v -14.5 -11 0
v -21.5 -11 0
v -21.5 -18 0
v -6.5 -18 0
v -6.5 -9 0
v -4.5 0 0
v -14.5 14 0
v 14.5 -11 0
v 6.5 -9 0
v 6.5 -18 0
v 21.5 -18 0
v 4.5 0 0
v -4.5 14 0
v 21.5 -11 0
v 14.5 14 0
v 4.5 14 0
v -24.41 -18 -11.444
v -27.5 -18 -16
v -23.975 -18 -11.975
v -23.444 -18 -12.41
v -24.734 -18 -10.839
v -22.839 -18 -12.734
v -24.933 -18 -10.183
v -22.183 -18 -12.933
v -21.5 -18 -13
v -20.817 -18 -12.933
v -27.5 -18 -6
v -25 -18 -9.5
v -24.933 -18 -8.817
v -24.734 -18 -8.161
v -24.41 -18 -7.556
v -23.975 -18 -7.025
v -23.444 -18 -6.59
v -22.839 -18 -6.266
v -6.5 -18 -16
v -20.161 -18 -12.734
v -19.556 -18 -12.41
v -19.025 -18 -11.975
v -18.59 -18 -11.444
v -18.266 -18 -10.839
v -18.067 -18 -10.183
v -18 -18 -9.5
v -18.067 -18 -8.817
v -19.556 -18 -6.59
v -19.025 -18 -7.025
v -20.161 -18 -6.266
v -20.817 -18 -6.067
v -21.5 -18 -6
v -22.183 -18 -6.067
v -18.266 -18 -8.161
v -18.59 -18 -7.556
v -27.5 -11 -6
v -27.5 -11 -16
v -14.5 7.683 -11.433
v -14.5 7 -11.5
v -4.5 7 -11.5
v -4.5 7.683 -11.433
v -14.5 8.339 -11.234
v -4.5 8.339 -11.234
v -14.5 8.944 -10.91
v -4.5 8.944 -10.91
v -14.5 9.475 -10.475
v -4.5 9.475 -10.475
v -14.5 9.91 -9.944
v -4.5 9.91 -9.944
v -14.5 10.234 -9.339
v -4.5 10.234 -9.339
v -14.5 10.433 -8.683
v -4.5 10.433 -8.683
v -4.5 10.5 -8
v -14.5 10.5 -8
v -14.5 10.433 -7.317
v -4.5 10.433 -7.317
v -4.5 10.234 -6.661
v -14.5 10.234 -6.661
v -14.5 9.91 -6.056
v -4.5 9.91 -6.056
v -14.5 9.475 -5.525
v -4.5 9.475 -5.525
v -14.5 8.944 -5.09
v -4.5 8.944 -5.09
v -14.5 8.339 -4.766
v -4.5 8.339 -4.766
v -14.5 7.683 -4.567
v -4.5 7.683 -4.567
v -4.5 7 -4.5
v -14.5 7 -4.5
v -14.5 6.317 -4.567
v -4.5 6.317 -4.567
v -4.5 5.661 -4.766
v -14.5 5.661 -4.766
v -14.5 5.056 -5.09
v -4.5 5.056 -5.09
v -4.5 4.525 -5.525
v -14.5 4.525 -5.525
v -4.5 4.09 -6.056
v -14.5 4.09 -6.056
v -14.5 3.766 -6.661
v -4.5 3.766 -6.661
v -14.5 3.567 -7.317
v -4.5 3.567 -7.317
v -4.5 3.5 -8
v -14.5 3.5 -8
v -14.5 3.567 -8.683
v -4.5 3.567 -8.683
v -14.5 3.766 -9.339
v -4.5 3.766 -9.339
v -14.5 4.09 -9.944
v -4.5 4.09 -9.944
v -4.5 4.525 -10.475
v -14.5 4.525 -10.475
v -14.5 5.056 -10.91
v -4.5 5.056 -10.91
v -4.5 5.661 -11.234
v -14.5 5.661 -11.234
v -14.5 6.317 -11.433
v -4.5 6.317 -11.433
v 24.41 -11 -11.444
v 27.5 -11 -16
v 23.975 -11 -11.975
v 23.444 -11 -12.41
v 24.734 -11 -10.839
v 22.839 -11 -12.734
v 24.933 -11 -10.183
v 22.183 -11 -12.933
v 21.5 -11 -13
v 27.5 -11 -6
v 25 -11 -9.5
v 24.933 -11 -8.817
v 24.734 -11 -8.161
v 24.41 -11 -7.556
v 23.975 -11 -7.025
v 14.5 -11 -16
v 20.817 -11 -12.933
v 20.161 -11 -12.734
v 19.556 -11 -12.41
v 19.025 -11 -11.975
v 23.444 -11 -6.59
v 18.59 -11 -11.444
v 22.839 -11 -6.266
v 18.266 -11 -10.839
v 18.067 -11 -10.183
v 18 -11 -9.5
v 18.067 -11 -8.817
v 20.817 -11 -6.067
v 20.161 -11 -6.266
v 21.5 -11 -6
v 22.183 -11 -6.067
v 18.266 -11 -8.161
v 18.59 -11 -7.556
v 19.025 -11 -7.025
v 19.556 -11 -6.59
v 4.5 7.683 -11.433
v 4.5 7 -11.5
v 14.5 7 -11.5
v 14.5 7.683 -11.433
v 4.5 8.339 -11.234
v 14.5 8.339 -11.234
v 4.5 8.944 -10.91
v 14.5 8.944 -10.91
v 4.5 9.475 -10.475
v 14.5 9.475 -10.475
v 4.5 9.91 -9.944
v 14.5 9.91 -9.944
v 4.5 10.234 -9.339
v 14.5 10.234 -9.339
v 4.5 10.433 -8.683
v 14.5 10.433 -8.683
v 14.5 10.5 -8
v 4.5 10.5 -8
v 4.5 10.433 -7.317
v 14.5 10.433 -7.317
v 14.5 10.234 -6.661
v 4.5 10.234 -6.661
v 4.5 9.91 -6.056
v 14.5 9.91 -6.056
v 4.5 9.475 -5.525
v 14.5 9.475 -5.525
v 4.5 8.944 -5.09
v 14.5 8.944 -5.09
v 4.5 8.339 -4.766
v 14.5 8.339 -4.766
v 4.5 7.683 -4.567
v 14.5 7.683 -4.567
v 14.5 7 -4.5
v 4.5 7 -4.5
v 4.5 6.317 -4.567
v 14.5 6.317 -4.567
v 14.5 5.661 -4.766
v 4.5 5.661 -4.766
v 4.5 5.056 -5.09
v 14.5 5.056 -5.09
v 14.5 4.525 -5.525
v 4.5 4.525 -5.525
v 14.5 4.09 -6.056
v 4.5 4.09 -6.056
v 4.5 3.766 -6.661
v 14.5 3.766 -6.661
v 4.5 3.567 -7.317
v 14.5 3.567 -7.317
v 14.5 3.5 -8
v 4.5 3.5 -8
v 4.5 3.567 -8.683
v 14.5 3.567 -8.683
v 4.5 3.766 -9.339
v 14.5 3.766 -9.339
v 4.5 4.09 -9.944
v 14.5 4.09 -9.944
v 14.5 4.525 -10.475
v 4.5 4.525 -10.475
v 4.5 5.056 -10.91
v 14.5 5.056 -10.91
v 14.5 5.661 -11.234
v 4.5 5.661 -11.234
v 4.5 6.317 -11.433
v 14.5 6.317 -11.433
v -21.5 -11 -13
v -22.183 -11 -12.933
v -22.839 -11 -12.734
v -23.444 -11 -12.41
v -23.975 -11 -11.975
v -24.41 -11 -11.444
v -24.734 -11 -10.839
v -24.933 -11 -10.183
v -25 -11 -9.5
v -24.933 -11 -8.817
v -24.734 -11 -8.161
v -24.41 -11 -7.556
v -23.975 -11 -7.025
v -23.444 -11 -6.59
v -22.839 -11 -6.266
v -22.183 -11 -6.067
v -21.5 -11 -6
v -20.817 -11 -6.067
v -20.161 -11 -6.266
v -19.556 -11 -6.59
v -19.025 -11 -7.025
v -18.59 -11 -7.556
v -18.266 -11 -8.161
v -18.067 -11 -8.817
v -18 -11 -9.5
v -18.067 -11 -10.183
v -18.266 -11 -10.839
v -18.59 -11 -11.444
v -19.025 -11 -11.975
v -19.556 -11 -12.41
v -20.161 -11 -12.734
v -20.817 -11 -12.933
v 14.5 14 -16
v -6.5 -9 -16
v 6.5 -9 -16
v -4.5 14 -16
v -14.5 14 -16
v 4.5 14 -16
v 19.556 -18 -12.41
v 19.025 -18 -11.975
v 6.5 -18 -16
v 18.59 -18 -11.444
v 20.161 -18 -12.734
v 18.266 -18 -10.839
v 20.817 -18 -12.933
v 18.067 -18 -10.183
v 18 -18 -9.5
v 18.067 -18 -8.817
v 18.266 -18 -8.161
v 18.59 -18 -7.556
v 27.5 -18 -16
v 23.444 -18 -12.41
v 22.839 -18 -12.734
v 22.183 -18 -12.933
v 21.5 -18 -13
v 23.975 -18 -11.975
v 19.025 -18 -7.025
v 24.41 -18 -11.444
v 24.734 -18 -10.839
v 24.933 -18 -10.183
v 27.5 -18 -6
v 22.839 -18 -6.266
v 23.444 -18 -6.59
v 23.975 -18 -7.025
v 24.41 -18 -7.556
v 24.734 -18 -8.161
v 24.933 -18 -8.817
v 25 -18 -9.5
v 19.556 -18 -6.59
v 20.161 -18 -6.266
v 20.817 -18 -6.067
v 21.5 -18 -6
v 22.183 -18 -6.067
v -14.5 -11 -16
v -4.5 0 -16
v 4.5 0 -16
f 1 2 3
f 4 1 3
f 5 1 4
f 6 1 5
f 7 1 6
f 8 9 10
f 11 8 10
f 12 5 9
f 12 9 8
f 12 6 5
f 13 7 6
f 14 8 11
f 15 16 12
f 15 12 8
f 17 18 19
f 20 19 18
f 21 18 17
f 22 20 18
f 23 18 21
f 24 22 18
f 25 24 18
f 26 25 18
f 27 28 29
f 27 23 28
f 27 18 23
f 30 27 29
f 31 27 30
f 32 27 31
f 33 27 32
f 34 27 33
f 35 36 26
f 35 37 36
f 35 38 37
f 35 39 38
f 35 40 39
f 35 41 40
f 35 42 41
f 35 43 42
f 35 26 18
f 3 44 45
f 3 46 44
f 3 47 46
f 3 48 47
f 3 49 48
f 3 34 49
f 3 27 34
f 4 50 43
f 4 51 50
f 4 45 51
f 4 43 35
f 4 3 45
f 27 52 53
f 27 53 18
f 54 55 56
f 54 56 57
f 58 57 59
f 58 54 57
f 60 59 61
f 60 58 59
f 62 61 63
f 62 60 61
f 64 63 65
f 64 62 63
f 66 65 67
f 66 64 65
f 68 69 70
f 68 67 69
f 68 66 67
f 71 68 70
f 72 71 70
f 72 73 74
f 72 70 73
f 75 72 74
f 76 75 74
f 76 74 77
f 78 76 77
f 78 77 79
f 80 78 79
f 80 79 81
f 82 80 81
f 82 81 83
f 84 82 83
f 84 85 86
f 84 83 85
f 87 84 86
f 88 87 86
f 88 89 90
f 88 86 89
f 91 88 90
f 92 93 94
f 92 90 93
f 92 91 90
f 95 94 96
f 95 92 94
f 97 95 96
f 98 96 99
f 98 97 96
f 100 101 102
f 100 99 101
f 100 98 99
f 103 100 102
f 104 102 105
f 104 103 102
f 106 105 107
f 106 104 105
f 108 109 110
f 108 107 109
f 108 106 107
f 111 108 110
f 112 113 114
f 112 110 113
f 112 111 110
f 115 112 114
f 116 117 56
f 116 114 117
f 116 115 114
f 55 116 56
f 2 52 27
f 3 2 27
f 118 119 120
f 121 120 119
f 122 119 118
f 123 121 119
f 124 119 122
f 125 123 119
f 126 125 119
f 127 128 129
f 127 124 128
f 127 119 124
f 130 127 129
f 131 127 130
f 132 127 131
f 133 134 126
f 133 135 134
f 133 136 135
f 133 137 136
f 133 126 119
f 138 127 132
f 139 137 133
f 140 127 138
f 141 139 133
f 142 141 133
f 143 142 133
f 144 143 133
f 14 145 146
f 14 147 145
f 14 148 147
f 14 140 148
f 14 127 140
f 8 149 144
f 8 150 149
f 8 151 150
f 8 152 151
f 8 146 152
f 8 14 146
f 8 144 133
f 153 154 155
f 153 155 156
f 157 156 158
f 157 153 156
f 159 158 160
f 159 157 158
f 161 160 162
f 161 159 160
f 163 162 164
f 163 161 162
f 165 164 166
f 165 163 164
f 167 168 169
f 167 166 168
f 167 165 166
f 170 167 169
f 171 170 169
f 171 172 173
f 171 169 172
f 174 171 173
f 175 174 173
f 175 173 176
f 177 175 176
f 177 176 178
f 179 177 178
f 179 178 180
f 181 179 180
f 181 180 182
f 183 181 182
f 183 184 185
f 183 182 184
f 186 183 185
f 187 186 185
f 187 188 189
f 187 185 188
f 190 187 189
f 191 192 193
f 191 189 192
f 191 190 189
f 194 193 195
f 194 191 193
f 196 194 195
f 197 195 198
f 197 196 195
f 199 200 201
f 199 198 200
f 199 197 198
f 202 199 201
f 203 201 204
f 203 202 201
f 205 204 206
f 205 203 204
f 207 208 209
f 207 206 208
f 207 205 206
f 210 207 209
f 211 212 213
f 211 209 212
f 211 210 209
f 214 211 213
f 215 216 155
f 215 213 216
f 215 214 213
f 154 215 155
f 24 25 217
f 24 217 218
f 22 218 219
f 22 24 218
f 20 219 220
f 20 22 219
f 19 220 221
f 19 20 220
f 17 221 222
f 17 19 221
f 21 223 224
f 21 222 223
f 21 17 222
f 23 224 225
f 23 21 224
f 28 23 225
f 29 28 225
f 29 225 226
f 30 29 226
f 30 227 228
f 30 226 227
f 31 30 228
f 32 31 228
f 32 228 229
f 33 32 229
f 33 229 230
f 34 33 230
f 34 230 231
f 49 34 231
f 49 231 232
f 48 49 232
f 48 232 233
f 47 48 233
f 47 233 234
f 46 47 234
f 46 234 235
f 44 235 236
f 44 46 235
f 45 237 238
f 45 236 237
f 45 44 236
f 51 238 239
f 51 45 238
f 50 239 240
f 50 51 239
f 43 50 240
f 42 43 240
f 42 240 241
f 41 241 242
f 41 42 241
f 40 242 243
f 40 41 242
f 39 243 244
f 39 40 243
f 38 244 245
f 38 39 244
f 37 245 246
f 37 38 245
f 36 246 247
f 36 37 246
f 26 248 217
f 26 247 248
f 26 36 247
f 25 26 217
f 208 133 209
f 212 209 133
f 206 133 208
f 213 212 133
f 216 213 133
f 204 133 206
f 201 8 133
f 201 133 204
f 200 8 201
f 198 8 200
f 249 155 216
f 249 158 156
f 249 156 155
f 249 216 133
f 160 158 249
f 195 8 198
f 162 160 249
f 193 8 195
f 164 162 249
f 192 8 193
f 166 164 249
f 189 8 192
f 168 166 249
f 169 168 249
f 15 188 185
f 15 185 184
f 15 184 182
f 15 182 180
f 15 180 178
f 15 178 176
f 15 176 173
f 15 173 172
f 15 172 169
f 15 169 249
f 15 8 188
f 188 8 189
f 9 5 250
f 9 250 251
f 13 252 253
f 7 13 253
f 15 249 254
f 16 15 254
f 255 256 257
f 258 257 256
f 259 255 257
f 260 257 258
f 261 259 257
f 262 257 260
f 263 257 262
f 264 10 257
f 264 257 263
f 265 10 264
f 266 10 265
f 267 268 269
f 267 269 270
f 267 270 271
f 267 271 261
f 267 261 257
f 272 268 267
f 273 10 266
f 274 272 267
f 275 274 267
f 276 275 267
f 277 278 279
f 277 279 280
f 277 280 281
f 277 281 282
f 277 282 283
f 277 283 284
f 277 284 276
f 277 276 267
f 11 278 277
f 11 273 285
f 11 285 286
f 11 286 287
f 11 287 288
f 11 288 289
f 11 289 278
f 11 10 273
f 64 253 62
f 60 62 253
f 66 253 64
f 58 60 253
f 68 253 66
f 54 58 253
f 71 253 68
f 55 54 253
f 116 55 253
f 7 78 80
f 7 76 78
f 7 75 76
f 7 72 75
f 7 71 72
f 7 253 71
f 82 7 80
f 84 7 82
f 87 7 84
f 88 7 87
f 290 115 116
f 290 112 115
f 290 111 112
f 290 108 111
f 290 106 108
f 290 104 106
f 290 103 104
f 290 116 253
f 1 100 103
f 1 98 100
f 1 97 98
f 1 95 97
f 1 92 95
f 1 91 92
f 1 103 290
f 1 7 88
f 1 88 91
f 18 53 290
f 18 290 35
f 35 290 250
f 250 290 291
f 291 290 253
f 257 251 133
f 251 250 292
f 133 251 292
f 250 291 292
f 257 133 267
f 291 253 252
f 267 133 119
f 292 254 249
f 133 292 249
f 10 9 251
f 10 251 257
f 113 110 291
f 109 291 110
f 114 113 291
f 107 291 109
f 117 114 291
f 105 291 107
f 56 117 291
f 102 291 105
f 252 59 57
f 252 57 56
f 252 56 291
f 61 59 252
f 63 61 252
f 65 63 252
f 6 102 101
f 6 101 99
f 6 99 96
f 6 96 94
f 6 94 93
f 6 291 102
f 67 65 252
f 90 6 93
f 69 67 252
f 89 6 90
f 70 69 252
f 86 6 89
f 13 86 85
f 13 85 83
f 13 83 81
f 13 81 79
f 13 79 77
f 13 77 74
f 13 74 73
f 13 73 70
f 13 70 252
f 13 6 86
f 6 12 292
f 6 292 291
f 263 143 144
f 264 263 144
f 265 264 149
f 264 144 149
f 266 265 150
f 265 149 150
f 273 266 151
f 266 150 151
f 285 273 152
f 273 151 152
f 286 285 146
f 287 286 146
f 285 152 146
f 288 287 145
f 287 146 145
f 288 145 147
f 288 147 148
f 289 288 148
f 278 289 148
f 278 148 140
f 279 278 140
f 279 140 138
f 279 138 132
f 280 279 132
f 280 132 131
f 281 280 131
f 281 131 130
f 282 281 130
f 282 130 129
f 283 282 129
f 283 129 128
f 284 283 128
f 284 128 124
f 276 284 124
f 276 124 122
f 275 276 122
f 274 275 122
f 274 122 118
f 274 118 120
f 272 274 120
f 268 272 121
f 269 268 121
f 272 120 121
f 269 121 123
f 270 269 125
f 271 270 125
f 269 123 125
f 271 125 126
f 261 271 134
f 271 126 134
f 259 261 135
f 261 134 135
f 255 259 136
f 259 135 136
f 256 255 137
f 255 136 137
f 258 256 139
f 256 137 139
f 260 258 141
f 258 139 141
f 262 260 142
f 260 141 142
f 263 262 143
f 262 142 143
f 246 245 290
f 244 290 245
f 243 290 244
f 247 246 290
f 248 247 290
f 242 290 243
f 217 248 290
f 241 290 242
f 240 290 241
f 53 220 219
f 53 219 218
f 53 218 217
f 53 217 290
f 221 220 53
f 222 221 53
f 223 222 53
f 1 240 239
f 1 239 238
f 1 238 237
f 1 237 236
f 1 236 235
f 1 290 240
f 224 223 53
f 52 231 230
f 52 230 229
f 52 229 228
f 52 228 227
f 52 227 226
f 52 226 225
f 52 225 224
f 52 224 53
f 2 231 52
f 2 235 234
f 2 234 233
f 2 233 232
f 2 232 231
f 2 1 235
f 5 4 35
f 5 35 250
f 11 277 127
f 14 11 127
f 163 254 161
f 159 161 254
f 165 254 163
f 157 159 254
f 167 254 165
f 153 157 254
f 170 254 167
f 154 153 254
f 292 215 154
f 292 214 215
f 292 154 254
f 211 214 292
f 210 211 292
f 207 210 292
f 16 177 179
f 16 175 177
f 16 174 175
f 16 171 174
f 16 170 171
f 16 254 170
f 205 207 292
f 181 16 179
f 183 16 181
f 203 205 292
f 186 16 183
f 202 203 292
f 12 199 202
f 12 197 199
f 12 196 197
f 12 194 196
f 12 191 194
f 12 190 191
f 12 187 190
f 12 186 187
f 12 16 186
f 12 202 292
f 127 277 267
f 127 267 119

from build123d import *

# Parameters (mm, degrees)
BOSS_EXTRUDE1_DEPTH     = 16
CUT_EXTRUDE1_DEPTH      = 49.414873748
CUT_EXTRUDE1_DEPTH_BACK = 49.414873748
SKETCH2_R               = 3.5
CHAMFER1_SIZE           = 6
CHAMFER2_SIZE           = 6
CUT_EXTRUDE2_DEPTH      = 41.462946012
CUT_EXTRUDE2_DEPTH_BACK = 16
SKETCH6_R               = 3.5
SKETCH6_3_R             = 3.5
CUT_EXTRUDE3_DEPTH      = 16


with BuildPart() as part:
    # Sketch1 → Boss-Extrude1 (new body)
    with BuildSketch(Plane.XY):
        Polygon((4.5, 0), (-4.5, 0), (-4.5, 14), (-14.5, 14), (-14.5, -11), (-27.5, -11), (-27.5, -18), (-6.5, -18), (-6.5, -9), (6.5, -9), (6.5, -18), (27.5, -18), (27.5, -11), (14.5, -11), (14.5, 14), (4.5, 14), align=None)
    extrude(amount=-BOSS_EXTRUDE1_DEPTH)

    # Sketch2 → Cut-Extrude1 (cut, two sides: drawn at the far end of the back side and taken through both)
    with BuildSketch(Plane(origin=(14.5, 0, 0), x_dir=(0, 0, -1), z_dir=(1, 0, 0)).offset(-CUT_EXTRUDE1_DEPTH_BACK)):
        with Locations((8, 7)):
            Circle(SKETCH2_R)
    extrude(amount=CUT_EXTRUDE1_DEPTH + CUT_EXTRUDE1_DEPTH_BACK, mode=Mode.SUBTRACT)

    # Chamfer1
    chamfer1_edges = [part.edges().sort_by_distance(p)[0] for p in [
        (-27.5, -14.5, 0),
    ]]
    chamfer(chamfer1_edges, length=CHAMFER1_SIZE)

    # Chamfer2
    chamfer2_edges = [part.edges().sort_by_distance(p)[0] for p in [
        (27.5, -14.5, 0),
    ]]
    chamfer(chamfer2_edges, length=CHAMFER2_SIZE)

    # Sketch6 → Cut-Extrude2 (cut, two sides: drawn at the far end of the back side and taken through both)
    with BuildSketch(Plane(origin=(0, -11, 0), x_dir=(1, 0, 0), z_dir=(0, 1, 0)).offset(-CUT_EXTRUDE2_DEPTH_BACK)):
        with Locations((-21.5, 9.5)):
            Circle(SKETCH6_R)
    extrude(amount=CUT_EXTRUDE2_DEPTH + CUT_EXTRUDE2_DEPTH_BACK, mode=Mode.SUBTRACT)

    # Sketch6<3> → Cut-Extrude3 (cut)
    with BuildSketch(Plane(origin=(0, -11, 0), x_dir=(1, 0, 0), z_dir=(0, 1, 0))):
        with Locations((21.5, 9.5)):
            Circle(SKETCH6_3_R)
    extrude(amount=-CUT_EXTRUDE3_DEPTH, mode=Mode.SUBTRACT)


solid = part.part
